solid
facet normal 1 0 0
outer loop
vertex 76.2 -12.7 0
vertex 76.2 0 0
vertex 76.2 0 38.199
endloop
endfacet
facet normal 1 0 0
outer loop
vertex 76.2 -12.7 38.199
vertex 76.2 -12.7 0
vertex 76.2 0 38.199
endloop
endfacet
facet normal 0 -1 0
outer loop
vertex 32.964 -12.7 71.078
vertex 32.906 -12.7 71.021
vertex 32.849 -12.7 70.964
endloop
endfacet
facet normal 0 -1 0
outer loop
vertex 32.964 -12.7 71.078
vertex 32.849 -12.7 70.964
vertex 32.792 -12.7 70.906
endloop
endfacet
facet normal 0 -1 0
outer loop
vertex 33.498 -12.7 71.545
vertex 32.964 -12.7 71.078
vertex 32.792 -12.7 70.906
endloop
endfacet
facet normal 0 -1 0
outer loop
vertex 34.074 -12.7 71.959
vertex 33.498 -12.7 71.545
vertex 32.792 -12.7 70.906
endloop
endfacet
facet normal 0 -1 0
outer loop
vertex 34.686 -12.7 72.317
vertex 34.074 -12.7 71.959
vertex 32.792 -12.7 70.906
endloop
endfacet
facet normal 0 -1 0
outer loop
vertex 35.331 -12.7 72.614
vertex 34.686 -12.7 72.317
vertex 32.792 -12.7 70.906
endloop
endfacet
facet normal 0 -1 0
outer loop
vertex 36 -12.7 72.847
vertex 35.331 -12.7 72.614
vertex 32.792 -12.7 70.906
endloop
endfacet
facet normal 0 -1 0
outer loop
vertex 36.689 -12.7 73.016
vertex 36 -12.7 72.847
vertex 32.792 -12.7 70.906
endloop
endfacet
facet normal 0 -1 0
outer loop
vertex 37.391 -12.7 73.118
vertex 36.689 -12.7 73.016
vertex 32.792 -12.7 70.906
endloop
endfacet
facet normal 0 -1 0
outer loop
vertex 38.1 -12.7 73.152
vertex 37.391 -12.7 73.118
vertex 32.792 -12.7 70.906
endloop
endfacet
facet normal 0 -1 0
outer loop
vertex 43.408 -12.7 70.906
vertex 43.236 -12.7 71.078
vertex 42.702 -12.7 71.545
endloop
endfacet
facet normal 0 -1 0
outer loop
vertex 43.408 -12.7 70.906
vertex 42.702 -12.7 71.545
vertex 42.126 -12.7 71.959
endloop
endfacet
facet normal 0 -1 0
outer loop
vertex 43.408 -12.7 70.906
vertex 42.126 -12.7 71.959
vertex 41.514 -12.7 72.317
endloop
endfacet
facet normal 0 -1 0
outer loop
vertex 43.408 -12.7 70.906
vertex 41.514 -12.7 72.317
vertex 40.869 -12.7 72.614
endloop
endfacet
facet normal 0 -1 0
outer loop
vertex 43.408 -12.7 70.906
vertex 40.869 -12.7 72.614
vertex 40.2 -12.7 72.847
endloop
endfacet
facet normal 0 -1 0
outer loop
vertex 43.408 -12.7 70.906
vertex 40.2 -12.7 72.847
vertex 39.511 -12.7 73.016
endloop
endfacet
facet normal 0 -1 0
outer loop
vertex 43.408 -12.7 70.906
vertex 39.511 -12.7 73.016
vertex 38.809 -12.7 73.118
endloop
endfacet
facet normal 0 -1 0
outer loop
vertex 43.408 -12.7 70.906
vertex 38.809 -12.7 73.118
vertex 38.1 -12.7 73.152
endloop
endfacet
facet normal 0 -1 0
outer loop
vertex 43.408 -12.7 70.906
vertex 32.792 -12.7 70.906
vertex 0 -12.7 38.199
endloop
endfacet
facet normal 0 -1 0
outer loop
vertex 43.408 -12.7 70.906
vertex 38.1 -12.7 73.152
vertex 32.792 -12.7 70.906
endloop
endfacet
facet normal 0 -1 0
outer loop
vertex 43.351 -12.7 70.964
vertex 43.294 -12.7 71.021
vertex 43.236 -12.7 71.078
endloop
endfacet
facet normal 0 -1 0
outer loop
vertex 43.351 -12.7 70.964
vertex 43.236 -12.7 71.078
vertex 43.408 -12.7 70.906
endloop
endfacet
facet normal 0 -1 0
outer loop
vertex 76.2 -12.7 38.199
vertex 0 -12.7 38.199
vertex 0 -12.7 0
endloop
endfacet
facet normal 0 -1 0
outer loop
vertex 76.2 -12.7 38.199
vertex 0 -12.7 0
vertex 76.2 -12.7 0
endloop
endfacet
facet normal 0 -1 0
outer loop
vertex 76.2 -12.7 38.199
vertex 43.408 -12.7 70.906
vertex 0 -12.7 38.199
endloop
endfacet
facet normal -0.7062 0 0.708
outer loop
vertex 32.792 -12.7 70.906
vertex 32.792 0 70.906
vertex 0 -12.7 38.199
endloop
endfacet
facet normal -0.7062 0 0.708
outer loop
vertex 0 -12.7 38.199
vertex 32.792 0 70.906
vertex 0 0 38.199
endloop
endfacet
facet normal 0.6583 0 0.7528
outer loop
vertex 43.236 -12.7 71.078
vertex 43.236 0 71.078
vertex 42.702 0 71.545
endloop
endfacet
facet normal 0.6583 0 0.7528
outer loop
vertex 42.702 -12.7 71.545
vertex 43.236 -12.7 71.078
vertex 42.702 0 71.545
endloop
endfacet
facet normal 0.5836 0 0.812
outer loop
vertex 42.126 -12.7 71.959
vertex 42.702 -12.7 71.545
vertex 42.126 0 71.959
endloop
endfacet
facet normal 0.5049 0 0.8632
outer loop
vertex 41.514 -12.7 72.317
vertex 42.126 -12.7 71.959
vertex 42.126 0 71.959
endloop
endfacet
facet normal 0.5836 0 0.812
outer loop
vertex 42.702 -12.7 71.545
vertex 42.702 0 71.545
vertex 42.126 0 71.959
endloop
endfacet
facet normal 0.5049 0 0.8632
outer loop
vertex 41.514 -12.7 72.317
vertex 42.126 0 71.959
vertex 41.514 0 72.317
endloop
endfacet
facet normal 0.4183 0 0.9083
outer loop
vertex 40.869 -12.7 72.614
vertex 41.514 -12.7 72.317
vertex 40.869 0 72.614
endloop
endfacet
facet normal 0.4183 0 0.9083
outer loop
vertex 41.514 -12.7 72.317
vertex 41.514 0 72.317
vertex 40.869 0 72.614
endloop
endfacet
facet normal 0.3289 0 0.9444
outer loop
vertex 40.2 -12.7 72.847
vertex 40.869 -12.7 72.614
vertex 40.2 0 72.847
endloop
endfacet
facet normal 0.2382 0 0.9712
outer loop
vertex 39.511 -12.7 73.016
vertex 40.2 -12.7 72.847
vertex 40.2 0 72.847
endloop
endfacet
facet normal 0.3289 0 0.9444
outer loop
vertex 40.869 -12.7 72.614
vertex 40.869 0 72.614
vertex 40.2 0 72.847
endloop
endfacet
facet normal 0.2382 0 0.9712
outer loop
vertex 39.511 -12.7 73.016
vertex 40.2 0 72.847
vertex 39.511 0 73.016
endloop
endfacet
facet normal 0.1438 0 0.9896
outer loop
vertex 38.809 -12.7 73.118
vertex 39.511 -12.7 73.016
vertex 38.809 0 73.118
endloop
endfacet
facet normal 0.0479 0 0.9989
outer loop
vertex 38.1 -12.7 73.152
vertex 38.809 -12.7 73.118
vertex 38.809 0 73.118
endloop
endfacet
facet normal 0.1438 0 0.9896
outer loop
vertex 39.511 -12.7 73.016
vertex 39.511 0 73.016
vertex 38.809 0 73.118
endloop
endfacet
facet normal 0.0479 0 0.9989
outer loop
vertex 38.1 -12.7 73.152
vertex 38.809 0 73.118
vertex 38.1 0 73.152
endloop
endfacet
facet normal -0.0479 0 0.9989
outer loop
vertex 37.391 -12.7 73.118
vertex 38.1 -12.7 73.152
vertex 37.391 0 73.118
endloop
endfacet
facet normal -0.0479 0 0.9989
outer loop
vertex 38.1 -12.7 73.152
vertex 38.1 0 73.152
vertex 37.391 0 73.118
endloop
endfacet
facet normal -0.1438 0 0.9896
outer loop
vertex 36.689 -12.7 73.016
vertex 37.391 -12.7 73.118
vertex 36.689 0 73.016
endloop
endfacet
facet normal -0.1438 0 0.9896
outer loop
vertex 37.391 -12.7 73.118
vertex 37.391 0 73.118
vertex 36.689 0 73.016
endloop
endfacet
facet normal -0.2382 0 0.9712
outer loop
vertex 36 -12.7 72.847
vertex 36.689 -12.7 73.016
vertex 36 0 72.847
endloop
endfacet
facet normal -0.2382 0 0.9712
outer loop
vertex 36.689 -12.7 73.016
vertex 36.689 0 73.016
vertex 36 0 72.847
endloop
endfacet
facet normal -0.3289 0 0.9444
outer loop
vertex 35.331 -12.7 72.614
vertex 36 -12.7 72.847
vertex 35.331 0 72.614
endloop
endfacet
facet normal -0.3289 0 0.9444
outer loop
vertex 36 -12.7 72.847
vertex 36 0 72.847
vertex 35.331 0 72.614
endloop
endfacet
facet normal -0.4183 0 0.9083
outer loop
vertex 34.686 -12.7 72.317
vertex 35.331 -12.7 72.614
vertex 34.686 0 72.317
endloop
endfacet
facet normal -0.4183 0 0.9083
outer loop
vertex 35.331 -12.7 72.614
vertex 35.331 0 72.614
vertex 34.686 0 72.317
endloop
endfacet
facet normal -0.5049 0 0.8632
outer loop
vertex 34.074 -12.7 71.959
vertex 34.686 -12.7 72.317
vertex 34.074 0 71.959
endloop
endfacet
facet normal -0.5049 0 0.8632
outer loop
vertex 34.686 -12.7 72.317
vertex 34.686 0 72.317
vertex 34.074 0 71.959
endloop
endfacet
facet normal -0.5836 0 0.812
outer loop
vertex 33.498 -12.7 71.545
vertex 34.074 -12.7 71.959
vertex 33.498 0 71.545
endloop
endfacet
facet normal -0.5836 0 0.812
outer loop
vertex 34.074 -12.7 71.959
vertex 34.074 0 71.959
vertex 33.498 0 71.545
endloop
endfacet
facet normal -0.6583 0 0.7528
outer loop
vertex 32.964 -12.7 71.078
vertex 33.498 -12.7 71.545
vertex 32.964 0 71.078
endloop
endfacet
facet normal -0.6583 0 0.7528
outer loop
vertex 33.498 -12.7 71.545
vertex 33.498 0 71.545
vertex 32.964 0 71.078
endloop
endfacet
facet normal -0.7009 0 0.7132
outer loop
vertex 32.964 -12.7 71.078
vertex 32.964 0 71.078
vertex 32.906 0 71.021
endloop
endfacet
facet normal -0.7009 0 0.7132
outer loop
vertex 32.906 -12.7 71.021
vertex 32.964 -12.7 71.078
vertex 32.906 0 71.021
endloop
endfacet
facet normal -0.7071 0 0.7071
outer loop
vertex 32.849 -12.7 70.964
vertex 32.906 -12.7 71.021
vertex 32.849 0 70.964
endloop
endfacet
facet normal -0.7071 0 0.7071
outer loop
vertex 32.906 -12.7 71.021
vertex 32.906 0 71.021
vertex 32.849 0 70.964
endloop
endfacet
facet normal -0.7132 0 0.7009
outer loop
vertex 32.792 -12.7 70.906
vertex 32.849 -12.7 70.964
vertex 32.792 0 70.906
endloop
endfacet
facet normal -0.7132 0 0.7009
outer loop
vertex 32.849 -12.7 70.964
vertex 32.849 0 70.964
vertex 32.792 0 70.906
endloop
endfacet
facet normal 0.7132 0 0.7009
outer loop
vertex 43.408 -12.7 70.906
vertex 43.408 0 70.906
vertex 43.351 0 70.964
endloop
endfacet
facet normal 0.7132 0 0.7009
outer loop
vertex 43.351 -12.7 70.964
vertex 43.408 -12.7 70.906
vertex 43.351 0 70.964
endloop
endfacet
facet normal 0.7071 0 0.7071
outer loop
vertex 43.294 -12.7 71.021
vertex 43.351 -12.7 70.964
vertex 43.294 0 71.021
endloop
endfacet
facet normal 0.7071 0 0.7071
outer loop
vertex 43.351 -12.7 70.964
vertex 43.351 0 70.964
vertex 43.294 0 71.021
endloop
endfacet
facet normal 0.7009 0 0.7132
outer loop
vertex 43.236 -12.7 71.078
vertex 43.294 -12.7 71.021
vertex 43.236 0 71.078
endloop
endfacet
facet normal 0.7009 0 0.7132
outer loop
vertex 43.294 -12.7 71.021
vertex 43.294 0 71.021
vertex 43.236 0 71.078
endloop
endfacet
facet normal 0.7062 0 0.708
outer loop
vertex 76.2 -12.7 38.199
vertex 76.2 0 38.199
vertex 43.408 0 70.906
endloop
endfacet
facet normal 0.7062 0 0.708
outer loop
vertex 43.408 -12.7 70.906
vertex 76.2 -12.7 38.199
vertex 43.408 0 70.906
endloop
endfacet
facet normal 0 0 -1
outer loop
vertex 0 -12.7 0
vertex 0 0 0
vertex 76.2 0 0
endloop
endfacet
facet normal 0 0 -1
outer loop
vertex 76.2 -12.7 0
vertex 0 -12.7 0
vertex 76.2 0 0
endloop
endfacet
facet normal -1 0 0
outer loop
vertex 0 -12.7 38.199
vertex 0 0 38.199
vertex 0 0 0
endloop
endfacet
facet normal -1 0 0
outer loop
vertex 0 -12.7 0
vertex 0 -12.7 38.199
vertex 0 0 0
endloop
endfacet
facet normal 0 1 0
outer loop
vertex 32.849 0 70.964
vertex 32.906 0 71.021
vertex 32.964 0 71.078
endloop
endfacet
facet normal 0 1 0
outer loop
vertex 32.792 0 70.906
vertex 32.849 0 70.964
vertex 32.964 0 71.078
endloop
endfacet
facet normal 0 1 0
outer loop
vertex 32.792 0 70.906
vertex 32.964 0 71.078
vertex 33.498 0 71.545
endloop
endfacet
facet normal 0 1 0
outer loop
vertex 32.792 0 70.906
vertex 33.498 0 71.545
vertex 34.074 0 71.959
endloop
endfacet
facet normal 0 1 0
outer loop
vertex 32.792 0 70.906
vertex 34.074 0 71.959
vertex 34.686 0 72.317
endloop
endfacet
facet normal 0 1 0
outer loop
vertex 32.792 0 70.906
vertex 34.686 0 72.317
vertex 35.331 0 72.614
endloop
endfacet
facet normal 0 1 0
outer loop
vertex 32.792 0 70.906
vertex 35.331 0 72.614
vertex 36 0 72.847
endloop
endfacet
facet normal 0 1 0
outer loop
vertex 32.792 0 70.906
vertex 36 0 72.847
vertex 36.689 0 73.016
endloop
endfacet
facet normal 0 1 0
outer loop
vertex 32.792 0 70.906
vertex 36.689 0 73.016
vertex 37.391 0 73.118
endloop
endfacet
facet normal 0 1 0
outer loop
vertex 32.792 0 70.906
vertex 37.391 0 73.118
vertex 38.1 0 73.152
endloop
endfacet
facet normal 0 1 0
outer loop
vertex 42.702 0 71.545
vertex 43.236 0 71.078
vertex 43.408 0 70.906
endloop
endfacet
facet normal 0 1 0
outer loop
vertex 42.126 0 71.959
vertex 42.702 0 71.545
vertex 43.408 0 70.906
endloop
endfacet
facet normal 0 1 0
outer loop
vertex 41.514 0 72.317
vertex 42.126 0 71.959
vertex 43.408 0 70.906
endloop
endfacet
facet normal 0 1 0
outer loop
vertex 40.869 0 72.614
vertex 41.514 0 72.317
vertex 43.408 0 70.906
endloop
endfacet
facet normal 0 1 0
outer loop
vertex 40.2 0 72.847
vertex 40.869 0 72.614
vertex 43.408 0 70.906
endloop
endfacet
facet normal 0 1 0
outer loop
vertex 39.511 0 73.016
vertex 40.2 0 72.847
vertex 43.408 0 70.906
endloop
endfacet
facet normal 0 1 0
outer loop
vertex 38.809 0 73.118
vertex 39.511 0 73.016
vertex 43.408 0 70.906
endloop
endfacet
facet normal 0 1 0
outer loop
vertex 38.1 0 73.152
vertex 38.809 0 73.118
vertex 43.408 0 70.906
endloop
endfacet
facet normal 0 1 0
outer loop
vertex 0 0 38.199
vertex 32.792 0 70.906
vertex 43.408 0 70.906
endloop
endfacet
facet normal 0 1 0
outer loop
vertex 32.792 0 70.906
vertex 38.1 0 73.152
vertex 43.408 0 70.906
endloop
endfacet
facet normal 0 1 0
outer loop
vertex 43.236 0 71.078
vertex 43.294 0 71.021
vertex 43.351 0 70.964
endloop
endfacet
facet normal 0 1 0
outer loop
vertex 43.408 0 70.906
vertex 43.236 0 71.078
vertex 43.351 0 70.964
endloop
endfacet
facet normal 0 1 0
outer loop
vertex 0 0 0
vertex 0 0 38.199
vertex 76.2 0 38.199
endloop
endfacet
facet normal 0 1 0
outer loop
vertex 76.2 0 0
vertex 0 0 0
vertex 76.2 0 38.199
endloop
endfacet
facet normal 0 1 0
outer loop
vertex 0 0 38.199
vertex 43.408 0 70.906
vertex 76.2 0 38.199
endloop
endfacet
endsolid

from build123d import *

# Parameters (mm, degrees)
F1_DEPTH = 12.7


with BuildPart() as f1:
    # F0 (on Front) → F1 (new body)
    with BuildSketch(Plane.XZ):
        with BuildLine():
            Line((0, 38.199143), (0, 0))
            Line((0, 0), (76.2, 0))
            Line((76.2, 0), (76.2, 38.199143))
            Line((76.2, 38.199143), (43.408294, 70.905519))
            Line((43.408294, 70.905519), (43.23573, 71.077634))
            ThreePointArc((43.23573, 71.077634), (38.1, 73.151625), (32.96427, 71.077634))
            Line((32.96427, 71.077634), (32.791706, 70.905519))
            Line((32.791706, 70.905519), (0, 38.199143))
        make_face()
        with BuildLine():
            ThreePointArc((32.96427, 71.077634), (32.877279, 70.992288), (32.791706, 70.905519))
            Line((32.791706, 70.905519), (32.96427, 71.077634))
        make_face()
        with BuildLine():
            Line((43.23573, 71.077634), (43.408294, 70.905519))
            ThreePointArc((43.408294, 70.905519), (43.322721, 70.992288), (43.23573, 71.077634))
        make_face()
    extrude(amount=F1_DEPTH)


solid = f1.part
